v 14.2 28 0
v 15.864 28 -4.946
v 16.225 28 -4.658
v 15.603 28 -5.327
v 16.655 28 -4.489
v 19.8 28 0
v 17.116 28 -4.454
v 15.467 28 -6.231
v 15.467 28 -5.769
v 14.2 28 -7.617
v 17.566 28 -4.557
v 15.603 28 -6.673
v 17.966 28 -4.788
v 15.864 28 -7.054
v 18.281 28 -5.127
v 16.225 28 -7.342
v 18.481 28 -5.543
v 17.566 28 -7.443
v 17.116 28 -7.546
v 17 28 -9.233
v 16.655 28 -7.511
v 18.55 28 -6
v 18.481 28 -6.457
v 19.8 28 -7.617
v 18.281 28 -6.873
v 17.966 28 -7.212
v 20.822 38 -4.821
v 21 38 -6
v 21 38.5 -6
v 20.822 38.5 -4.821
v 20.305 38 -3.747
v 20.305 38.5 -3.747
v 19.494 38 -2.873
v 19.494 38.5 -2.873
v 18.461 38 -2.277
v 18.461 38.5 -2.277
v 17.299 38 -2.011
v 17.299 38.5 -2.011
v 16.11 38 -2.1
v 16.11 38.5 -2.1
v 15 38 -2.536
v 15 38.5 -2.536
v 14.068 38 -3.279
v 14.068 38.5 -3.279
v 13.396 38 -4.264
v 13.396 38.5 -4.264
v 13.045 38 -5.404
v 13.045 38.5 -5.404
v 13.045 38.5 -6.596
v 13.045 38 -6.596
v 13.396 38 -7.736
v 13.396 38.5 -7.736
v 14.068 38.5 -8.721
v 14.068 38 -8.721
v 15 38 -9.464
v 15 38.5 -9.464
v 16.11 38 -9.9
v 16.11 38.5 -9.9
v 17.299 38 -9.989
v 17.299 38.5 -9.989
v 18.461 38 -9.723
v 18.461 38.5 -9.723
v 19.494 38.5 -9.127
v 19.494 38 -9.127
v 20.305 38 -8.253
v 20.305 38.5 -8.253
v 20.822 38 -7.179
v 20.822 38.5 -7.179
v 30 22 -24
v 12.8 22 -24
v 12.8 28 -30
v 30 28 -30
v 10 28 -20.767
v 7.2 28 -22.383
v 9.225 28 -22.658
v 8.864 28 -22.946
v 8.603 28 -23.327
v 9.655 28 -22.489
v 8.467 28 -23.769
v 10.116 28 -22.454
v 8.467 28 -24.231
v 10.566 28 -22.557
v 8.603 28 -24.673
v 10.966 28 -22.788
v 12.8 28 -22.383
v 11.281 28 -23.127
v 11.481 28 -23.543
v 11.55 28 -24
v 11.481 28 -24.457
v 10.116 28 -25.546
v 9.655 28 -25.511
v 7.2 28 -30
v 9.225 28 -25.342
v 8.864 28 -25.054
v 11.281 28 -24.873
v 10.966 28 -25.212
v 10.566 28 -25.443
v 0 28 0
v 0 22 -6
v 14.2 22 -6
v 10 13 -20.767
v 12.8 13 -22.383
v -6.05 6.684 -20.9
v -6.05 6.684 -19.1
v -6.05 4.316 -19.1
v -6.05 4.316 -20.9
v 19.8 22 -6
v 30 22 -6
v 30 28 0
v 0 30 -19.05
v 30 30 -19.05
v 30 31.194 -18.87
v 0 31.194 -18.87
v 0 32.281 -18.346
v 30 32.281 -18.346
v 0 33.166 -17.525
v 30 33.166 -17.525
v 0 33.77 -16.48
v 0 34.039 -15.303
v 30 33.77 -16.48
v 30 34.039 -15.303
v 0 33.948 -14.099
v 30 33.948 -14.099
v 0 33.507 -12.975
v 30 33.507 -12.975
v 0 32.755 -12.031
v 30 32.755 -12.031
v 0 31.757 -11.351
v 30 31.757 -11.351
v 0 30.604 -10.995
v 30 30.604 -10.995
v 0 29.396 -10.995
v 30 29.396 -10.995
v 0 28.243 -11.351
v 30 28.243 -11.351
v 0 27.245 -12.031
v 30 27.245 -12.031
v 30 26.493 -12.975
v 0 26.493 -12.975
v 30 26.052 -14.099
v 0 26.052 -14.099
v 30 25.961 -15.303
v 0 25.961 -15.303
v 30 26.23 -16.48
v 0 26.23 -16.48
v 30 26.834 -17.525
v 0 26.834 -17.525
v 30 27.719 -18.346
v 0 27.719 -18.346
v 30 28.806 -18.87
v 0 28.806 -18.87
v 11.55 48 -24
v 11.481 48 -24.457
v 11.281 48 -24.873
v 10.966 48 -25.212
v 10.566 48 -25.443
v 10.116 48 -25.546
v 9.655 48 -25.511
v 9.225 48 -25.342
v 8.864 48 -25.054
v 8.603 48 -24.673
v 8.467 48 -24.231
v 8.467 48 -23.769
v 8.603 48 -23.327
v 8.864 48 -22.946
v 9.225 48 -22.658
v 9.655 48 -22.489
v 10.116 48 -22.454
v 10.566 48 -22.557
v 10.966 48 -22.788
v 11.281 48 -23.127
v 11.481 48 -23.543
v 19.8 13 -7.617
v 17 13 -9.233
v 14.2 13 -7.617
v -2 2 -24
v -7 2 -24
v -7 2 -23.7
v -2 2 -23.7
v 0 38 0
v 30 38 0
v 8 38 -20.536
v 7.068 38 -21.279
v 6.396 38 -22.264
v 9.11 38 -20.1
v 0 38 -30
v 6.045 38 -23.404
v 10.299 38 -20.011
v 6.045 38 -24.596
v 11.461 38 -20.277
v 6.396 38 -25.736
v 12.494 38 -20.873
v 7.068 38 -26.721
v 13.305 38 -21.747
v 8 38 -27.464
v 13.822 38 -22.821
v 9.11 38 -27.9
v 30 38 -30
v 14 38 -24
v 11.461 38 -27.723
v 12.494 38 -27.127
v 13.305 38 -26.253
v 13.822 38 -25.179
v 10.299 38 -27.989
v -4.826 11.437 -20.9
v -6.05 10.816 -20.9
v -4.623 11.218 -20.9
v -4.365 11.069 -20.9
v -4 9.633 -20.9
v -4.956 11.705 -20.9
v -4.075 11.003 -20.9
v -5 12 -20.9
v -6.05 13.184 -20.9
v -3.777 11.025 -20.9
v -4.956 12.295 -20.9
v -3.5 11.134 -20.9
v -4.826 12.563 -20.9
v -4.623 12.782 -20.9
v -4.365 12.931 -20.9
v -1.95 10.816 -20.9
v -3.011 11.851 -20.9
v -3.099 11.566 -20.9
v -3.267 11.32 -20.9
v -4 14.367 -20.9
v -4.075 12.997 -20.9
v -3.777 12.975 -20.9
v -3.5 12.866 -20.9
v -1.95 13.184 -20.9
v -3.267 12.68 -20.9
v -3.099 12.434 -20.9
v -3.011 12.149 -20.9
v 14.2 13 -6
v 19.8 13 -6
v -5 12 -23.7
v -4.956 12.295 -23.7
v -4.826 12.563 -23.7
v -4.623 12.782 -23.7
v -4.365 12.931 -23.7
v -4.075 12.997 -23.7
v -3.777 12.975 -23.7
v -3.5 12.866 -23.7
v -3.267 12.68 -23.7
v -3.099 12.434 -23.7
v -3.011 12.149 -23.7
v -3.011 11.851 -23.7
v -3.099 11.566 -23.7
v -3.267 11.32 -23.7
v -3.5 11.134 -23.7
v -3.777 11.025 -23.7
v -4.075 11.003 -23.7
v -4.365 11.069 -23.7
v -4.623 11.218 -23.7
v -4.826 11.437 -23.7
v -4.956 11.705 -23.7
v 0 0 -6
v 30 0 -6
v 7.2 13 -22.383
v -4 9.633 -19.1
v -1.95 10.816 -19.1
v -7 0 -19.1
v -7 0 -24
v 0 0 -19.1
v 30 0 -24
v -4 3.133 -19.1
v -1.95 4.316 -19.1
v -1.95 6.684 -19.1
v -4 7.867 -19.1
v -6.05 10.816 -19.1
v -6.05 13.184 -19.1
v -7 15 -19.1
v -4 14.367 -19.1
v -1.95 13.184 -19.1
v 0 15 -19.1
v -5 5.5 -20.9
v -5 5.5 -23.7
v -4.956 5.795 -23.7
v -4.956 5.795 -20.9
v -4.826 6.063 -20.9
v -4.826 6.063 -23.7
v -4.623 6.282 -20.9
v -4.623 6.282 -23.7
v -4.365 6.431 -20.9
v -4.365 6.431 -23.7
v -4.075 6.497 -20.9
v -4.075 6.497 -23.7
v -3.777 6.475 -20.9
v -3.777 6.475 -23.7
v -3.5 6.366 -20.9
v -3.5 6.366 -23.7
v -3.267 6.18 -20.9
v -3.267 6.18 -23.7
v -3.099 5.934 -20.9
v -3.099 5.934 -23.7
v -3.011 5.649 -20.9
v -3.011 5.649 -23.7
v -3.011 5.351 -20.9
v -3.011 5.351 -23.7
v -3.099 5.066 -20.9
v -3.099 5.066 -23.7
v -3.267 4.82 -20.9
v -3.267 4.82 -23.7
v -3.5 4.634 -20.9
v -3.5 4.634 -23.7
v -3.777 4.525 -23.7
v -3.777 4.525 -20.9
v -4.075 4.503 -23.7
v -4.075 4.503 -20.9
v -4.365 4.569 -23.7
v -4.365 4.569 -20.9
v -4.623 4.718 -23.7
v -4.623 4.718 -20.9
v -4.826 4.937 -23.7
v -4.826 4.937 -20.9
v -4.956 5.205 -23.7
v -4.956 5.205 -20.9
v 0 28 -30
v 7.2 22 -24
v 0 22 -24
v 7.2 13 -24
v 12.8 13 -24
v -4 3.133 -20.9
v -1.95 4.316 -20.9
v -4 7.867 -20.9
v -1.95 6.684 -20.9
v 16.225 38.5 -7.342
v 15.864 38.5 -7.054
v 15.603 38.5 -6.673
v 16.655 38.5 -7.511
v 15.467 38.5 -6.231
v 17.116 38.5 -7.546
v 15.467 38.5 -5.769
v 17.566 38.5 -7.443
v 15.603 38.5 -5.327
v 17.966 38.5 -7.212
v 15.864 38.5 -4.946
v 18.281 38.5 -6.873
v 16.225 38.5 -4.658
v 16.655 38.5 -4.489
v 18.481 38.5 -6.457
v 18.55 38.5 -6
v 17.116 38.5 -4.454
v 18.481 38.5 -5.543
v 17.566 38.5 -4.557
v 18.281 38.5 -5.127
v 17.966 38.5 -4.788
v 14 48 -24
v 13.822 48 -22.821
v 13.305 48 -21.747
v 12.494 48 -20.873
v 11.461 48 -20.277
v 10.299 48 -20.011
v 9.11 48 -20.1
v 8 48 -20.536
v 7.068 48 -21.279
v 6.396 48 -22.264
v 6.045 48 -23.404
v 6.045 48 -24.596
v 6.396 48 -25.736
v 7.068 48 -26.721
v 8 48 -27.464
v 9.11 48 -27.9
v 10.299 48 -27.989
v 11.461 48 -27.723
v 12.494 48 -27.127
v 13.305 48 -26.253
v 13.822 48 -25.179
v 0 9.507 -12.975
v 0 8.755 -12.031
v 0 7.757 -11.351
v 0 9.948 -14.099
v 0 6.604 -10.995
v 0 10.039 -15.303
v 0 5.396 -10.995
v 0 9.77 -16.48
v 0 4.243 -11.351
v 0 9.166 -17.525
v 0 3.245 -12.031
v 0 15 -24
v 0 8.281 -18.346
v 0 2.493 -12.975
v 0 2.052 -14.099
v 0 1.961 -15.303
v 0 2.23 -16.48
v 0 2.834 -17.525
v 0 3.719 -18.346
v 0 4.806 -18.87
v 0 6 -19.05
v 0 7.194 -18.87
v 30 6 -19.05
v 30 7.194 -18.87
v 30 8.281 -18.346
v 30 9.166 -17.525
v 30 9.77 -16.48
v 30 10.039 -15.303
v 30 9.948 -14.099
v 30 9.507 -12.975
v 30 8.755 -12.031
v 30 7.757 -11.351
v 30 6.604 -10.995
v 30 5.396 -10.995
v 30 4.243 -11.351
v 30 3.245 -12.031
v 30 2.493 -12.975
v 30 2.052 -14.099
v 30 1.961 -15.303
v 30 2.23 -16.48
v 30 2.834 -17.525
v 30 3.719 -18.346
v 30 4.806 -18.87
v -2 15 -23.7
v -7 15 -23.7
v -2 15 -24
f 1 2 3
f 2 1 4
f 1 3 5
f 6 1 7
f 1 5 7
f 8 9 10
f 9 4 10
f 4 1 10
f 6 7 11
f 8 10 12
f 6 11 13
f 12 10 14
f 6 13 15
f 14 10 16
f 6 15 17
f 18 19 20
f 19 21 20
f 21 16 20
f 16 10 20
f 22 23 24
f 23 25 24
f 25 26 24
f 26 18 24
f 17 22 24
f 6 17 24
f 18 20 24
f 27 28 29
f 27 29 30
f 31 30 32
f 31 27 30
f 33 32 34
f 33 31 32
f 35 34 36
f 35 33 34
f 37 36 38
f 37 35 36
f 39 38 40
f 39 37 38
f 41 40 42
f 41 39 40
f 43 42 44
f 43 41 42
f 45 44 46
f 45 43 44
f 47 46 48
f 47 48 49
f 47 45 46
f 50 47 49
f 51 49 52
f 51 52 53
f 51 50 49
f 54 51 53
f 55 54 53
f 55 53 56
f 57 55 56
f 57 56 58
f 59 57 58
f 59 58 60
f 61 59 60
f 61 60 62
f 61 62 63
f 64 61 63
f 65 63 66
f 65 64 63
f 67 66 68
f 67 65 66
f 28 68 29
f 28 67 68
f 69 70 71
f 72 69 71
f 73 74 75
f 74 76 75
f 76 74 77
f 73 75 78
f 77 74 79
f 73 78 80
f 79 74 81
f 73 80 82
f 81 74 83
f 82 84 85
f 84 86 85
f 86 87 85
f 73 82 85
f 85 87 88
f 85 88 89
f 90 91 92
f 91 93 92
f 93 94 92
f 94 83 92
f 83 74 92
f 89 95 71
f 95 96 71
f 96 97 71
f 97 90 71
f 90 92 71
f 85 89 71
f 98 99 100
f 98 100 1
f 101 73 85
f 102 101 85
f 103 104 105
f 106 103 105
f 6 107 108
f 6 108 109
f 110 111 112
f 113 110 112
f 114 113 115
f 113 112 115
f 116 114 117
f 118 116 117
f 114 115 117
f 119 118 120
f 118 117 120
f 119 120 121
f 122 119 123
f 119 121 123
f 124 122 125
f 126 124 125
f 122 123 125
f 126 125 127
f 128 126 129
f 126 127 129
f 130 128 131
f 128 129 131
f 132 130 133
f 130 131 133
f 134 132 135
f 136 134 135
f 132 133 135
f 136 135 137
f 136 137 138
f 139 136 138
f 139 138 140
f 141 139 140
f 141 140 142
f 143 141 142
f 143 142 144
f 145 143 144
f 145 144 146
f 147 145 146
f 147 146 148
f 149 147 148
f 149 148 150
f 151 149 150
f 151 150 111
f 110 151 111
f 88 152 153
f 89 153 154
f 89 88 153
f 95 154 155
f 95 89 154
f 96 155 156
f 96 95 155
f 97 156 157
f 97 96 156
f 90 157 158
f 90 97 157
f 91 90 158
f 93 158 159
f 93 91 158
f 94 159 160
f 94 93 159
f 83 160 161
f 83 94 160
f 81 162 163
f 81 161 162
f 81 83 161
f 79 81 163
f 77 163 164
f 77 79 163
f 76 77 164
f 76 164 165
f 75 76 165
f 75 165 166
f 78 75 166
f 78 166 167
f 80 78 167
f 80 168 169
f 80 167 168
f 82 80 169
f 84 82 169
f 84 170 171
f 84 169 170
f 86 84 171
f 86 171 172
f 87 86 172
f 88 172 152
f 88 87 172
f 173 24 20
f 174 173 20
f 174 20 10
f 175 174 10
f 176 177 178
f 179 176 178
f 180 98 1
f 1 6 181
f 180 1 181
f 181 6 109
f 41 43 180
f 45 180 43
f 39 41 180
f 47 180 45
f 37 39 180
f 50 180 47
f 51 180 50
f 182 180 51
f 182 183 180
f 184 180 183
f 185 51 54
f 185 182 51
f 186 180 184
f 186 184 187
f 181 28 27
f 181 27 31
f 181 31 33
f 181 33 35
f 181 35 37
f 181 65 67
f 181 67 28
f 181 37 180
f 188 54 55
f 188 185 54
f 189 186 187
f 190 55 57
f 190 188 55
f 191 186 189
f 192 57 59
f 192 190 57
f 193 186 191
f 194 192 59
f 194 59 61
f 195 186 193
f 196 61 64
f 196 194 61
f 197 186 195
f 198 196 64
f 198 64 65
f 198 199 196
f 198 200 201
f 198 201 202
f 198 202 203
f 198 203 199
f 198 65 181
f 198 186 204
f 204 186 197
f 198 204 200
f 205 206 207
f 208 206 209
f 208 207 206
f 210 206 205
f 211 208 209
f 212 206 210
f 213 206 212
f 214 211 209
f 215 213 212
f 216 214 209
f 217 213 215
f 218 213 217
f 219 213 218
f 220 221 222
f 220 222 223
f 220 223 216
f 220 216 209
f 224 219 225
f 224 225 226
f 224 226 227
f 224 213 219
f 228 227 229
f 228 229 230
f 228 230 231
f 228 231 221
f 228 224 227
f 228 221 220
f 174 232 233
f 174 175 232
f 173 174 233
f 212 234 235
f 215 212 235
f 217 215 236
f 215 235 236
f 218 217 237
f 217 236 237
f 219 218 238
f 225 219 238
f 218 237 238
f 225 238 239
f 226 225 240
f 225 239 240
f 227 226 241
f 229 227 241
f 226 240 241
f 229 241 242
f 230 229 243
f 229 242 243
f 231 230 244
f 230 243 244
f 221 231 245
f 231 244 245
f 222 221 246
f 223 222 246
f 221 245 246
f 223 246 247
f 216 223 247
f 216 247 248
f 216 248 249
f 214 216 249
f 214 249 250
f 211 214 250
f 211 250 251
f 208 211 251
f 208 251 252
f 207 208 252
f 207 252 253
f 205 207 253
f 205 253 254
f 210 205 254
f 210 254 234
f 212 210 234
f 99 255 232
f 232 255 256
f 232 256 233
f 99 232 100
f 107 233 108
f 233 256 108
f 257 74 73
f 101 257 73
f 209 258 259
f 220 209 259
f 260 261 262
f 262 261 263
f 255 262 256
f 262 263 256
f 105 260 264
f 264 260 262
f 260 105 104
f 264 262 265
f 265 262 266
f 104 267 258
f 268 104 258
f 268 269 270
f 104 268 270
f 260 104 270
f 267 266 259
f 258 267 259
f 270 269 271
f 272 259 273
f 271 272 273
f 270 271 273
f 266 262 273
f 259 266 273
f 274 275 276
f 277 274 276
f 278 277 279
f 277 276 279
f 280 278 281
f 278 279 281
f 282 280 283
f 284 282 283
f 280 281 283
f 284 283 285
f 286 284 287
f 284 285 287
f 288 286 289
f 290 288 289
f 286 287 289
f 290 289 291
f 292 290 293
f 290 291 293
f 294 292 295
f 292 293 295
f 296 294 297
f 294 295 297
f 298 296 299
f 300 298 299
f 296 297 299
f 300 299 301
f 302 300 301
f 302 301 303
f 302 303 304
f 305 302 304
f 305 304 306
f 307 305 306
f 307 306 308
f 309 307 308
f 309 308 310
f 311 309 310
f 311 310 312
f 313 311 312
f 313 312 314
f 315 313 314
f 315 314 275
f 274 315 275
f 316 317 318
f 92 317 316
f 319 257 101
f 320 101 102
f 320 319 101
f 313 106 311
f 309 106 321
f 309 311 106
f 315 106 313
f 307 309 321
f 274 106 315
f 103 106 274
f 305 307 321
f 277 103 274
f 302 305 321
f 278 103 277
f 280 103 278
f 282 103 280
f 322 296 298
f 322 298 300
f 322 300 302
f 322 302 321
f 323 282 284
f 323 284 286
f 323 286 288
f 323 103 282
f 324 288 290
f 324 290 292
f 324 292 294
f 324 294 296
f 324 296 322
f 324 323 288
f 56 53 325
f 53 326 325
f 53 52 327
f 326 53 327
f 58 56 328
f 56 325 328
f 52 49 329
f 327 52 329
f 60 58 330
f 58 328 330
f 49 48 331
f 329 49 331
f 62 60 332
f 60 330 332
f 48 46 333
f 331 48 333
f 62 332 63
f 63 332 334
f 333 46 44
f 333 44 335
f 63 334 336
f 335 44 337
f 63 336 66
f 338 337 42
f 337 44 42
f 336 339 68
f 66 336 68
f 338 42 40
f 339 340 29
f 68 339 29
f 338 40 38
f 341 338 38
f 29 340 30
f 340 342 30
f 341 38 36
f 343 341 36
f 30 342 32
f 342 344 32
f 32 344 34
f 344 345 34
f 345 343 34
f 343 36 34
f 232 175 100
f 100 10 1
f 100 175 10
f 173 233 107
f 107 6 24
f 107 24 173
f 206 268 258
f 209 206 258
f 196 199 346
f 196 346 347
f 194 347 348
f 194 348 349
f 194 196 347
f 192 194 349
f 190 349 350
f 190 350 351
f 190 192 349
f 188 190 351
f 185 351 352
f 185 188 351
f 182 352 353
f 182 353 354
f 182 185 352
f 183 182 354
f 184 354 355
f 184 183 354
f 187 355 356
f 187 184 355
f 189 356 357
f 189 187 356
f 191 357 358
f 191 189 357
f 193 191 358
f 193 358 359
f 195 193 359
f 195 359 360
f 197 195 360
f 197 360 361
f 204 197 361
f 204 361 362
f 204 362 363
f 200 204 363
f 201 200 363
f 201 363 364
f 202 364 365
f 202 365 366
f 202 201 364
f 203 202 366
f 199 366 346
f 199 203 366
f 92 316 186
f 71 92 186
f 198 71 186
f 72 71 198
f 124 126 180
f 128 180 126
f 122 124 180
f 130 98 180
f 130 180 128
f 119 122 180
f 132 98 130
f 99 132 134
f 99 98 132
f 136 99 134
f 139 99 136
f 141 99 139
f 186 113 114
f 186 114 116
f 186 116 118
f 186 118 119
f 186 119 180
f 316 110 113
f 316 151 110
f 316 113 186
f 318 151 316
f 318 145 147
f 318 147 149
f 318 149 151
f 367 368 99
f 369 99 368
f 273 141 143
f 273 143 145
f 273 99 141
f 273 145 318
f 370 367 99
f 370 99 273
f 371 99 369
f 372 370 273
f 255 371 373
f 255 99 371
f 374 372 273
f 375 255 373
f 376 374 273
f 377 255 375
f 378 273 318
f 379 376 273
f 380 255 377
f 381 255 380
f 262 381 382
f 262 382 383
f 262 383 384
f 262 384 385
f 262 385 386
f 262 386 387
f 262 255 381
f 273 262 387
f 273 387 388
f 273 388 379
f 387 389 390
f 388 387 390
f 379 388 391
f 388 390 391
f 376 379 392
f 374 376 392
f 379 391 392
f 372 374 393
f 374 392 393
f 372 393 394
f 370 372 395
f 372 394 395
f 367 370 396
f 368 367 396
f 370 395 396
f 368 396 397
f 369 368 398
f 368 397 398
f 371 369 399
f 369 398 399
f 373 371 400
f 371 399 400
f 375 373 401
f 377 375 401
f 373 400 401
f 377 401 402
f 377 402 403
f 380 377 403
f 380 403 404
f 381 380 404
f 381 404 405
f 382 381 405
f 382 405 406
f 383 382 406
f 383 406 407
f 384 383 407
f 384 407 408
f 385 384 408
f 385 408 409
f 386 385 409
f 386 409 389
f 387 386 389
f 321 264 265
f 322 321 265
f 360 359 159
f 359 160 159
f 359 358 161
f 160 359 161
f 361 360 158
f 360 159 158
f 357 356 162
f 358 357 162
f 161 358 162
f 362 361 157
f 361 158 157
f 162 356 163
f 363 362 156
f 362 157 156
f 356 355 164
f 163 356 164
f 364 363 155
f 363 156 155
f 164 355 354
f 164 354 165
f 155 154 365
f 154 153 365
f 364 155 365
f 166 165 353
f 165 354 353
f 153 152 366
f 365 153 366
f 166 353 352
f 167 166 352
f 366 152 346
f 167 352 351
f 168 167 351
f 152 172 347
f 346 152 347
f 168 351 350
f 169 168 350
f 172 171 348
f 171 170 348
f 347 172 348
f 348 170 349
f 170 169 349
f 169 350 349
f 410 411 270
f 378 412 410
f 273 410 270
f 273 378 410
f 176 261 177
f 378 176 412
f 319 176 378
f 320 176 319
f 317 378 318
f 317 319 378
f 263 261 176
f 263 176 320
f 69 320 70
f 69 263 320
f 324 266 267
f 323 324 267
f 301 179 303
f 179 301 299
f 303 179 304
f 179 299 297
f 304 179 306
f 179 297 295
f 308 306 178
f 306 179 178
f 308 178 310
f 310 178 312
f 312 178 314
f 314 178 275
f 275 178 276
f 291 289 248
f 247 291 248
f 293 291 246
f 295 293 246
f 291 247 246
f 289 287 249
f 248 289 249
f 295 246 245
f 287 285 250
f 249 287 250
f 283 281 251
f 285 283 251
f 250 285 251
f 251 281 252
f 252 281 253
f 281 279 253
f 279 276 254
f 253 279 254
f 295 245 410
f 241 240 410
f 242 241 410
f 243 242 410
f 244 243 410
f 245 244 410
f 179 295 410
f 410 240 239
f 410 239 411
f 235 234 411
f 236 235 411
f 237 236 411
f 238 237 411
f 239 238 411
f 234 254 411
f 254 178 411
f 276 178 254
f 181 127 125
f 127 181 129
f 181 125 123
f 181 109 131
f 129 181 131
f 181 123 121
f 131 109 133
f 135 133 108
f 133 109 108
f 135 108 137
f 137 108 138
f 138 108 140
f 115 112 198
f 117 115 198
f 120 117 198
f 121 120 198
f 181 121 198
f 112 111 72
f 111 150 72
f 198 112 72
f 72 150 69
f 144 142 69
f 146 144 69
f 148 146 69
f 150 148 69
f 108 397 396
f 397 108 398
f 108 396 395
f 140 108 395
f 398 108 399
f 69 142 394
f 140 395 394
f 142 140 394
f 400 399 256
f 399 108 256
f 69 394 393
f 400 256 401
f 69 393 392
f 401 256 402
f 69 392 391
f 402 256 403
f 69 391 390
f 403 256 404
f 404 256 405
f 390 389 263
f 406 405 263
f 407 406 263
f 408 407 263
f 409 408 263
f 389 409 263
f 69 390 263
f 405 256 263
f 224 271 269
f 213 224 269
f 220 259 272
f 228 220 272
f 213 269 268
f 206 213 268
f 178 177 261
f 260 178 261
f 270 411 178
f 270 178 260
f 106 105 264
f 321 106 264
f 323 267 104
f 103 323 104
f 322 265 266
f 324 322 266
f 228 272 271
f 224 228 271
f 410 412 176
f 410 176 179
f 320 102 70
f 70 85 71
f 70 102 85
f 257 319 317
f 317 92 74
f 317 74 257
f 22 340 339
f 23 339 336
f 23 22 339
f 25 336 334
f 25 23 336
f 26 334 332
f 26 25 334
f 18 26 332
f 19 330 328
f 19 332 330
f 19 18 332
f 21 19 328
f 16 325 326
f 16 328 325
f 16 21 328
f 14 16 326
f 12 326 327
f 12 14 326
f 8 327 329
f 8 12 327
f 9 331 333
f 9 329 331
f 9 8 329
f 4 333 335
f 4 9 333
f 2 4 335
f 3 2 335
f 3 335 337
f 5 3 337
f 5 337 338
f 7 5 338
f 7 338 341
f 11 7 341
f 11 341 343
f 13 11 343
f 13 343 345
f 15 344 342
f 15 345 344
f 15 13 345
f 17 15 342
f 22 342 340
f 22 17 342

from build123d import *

# Parameters (mm, degrees)
SKETCH_1_W           = 30
SKETCH_1_H           = 30
EXTRUDE_1_DEPTH      = 38
SKETCH_3_R           = 4
EXTRUDE_3_DEPTH      = 10
SKETCH_7_R           = 4
EXTRUDE_4_DEPTH      = 0.5
SKETCH_6_R           = 4.05
CUT_EXTRUDE_3_DEPTH  = 31
SKETCH_9_R           = 1.55
CUT_EXTRUDE_4_DEPTH  = 21
CUT_EXTRUDE_6_DEPTH  = 31
CUT_EXTRUDE_5_DEPTH  = 15
SKETCH_12_W          = 4.9
SKETCH_12_H          = 15
EXTRUDE_5_DEPTH      = 7
SKETCH_14_W          = 0.3
SKETCH_14_H          = 13
CUT_EXTRUDE_7_DEPTH  = 5
SKETCH_15_R          = 1
CUT_EXTRUDE_8_DEPTH  = 24.7
CUT_EXTRUDE_10_DEPTH = 1.8


with BuildPart() as part:
    # 草图1 → 凸台-拉伸1 (new body)
    with BuildSketch(Plane(origin=(0, 0, 0), x_dir=(1, 0, 0), z_dir=(0, 1, 0))):
        with Locations((15, 15)):
            Rectangle(SKETCH_1_W, SKETCH_1_H)
    extrude(amount=EXTRUDE_1_DEPTH)

    # 草图3 → 凸台-拉伸3 (add)
    with BuildSketch(Plane(origin=(0, 38, -50), x_dir=(1, 0, 0), z_dir=(0, -1, 0))):
        with Locations((10, 26)):
            Circle(SKETCH_3_R)
    extrude(amount=-EXTRUDE_3_DEPTH)

    # 草图7 → 凸台-拉伸4 (add)
    with BuildSketch(Plane.XZ.offset(-38)):
        with Locations((17, -6)):
            Circle(SKETCH_7_R)
    extrude(amount=-EXTRUDE_4_DEPTH)

    # 草图6 → 切除-拉伸3 (cut, through all)
    with BuildSketch(Plane(origin=(30, 0, 0), x_dir=(0, 0, -1), z_dir=(1, 0, 0))):
        with Locations((15, 6)):
            Circle(SKETCH_6_R)
        with Locations((15, 30)):
            Circle(SKETCH_6_R)
    extrude(amount=-CUT_EXTRUDE_3_DEPTH, mode=Mode.SUBTRACT)

    # 草图9 → 切除-拉伸4 (cut, through all)
    with BuildSketch(Plane(origin=(0, 28, 0), x_dir=(1, 0, 0), z_dir=(0, 1, 0))):
        with Locations((17, 6)):
            Circle(SKETCH_9_R)
        with Locations((10, 24)):
            Circle(SKETCH_9_R)
    extrude(amount=CUT_EXTRUDE_4_DEPTH, mode=Mode.SUBTRACT)

    # 草图11 → 切除-拉伸6 (cut, through all)
    with BuildSketch(Plane(origin=(30, 0, 0), x_dir=(0, 0, -1), z_dir=(1, 0, 0))):
        Polygon((6, 0), (6, 22), (0, 28), (0, 0), align=None)
        Polygon((24, 0), (24, 22), (30, 28), (30, 0), align=None)
    extrude(amount=-CUT_EXTRUDE_6_DEPTH, mode=Mode.SUBTRACT)

    # 草图10 → 切除-拉伸5 (cut)
    with BuildSketch(Plane(origin=(0, 28, 0), x_dir=(1, 0, 0), z_dir=(0, 1, 0))):
        Polygon((19.8, 0), (19.8, 7.616580754), (17, 9.233161507), (14.2, 7.616580754), (14.2, 0), align=None)
        Polygon((10, 20.766838493), (12.8, 22.383419246), (12.8, 30), (7.2, 30), (7.2, 22.383419246), align=None)
    extrude(amount=-CUT_EXTRUDE_5_DEPTH, mode=Mode.SUBTRACT)

    # 草图12 → 凸台-拉伸5 (add)
    with BuildSketch(Plane.ZY):
        with Locations((-21.55, 7.5)):
            Rectangle(SKETCH_12_W, SKETCH_12_H)
    extrude(amount=EXTRUDE_5_DEPTH)

    # 草图14 → 切除-拉伸7 (cut)
    with BuildSketch(Plane.ZY.offset(7)):
        with Locations((-23.85, 8.5)):
            Rectangle(SKETCH_14_W, SKETCH_14_H)
    extrude(amount=-CUT_EXTRUDE_7_DEPTH, mode=Mode.SUBTRACT)

    # 草图15 → 切除-拉伸8 (cut, through all)
    with BuildSketch(Plane(origin=(0, 0, -23.7), x_dir=(-1, 0, 0), z_dir=(0, 0, -1))):
        with Locations((4, 12)):
            Circle(SKETCH_15_R)
        with Locations((4, 5.5)):
            Circle(SKETCH_15_R)
    extrude(amount=-CUT_EXTRUDE_8_DEPTH, mode=Mode.SUBTRACT)

    # 草图17 → 切除-拉伸10 (cut)
    with BuildSketch(Plane.XY.offset(-19.1)):
        Polygon((-1.95, 10.816431948), (-1.95, 13.183568052), (-4, 14.367136104), (-6.05, 13.183568052), (-6.05, 10.816431948), (-4, 9.632863896), align=None)
        Polygon((-1.95, 4.316431948), (-1.95, 6.683568052), (-4, 7.867136104), (-6.05, 6.683568052), (-6.05, 4.316431948), (-4, 3.132863896), align=None)
    extrude(amount=-CUT_EXTRUDE_10_DEPTH, mode=Mode.SUBTRACT)


solid = part.part
